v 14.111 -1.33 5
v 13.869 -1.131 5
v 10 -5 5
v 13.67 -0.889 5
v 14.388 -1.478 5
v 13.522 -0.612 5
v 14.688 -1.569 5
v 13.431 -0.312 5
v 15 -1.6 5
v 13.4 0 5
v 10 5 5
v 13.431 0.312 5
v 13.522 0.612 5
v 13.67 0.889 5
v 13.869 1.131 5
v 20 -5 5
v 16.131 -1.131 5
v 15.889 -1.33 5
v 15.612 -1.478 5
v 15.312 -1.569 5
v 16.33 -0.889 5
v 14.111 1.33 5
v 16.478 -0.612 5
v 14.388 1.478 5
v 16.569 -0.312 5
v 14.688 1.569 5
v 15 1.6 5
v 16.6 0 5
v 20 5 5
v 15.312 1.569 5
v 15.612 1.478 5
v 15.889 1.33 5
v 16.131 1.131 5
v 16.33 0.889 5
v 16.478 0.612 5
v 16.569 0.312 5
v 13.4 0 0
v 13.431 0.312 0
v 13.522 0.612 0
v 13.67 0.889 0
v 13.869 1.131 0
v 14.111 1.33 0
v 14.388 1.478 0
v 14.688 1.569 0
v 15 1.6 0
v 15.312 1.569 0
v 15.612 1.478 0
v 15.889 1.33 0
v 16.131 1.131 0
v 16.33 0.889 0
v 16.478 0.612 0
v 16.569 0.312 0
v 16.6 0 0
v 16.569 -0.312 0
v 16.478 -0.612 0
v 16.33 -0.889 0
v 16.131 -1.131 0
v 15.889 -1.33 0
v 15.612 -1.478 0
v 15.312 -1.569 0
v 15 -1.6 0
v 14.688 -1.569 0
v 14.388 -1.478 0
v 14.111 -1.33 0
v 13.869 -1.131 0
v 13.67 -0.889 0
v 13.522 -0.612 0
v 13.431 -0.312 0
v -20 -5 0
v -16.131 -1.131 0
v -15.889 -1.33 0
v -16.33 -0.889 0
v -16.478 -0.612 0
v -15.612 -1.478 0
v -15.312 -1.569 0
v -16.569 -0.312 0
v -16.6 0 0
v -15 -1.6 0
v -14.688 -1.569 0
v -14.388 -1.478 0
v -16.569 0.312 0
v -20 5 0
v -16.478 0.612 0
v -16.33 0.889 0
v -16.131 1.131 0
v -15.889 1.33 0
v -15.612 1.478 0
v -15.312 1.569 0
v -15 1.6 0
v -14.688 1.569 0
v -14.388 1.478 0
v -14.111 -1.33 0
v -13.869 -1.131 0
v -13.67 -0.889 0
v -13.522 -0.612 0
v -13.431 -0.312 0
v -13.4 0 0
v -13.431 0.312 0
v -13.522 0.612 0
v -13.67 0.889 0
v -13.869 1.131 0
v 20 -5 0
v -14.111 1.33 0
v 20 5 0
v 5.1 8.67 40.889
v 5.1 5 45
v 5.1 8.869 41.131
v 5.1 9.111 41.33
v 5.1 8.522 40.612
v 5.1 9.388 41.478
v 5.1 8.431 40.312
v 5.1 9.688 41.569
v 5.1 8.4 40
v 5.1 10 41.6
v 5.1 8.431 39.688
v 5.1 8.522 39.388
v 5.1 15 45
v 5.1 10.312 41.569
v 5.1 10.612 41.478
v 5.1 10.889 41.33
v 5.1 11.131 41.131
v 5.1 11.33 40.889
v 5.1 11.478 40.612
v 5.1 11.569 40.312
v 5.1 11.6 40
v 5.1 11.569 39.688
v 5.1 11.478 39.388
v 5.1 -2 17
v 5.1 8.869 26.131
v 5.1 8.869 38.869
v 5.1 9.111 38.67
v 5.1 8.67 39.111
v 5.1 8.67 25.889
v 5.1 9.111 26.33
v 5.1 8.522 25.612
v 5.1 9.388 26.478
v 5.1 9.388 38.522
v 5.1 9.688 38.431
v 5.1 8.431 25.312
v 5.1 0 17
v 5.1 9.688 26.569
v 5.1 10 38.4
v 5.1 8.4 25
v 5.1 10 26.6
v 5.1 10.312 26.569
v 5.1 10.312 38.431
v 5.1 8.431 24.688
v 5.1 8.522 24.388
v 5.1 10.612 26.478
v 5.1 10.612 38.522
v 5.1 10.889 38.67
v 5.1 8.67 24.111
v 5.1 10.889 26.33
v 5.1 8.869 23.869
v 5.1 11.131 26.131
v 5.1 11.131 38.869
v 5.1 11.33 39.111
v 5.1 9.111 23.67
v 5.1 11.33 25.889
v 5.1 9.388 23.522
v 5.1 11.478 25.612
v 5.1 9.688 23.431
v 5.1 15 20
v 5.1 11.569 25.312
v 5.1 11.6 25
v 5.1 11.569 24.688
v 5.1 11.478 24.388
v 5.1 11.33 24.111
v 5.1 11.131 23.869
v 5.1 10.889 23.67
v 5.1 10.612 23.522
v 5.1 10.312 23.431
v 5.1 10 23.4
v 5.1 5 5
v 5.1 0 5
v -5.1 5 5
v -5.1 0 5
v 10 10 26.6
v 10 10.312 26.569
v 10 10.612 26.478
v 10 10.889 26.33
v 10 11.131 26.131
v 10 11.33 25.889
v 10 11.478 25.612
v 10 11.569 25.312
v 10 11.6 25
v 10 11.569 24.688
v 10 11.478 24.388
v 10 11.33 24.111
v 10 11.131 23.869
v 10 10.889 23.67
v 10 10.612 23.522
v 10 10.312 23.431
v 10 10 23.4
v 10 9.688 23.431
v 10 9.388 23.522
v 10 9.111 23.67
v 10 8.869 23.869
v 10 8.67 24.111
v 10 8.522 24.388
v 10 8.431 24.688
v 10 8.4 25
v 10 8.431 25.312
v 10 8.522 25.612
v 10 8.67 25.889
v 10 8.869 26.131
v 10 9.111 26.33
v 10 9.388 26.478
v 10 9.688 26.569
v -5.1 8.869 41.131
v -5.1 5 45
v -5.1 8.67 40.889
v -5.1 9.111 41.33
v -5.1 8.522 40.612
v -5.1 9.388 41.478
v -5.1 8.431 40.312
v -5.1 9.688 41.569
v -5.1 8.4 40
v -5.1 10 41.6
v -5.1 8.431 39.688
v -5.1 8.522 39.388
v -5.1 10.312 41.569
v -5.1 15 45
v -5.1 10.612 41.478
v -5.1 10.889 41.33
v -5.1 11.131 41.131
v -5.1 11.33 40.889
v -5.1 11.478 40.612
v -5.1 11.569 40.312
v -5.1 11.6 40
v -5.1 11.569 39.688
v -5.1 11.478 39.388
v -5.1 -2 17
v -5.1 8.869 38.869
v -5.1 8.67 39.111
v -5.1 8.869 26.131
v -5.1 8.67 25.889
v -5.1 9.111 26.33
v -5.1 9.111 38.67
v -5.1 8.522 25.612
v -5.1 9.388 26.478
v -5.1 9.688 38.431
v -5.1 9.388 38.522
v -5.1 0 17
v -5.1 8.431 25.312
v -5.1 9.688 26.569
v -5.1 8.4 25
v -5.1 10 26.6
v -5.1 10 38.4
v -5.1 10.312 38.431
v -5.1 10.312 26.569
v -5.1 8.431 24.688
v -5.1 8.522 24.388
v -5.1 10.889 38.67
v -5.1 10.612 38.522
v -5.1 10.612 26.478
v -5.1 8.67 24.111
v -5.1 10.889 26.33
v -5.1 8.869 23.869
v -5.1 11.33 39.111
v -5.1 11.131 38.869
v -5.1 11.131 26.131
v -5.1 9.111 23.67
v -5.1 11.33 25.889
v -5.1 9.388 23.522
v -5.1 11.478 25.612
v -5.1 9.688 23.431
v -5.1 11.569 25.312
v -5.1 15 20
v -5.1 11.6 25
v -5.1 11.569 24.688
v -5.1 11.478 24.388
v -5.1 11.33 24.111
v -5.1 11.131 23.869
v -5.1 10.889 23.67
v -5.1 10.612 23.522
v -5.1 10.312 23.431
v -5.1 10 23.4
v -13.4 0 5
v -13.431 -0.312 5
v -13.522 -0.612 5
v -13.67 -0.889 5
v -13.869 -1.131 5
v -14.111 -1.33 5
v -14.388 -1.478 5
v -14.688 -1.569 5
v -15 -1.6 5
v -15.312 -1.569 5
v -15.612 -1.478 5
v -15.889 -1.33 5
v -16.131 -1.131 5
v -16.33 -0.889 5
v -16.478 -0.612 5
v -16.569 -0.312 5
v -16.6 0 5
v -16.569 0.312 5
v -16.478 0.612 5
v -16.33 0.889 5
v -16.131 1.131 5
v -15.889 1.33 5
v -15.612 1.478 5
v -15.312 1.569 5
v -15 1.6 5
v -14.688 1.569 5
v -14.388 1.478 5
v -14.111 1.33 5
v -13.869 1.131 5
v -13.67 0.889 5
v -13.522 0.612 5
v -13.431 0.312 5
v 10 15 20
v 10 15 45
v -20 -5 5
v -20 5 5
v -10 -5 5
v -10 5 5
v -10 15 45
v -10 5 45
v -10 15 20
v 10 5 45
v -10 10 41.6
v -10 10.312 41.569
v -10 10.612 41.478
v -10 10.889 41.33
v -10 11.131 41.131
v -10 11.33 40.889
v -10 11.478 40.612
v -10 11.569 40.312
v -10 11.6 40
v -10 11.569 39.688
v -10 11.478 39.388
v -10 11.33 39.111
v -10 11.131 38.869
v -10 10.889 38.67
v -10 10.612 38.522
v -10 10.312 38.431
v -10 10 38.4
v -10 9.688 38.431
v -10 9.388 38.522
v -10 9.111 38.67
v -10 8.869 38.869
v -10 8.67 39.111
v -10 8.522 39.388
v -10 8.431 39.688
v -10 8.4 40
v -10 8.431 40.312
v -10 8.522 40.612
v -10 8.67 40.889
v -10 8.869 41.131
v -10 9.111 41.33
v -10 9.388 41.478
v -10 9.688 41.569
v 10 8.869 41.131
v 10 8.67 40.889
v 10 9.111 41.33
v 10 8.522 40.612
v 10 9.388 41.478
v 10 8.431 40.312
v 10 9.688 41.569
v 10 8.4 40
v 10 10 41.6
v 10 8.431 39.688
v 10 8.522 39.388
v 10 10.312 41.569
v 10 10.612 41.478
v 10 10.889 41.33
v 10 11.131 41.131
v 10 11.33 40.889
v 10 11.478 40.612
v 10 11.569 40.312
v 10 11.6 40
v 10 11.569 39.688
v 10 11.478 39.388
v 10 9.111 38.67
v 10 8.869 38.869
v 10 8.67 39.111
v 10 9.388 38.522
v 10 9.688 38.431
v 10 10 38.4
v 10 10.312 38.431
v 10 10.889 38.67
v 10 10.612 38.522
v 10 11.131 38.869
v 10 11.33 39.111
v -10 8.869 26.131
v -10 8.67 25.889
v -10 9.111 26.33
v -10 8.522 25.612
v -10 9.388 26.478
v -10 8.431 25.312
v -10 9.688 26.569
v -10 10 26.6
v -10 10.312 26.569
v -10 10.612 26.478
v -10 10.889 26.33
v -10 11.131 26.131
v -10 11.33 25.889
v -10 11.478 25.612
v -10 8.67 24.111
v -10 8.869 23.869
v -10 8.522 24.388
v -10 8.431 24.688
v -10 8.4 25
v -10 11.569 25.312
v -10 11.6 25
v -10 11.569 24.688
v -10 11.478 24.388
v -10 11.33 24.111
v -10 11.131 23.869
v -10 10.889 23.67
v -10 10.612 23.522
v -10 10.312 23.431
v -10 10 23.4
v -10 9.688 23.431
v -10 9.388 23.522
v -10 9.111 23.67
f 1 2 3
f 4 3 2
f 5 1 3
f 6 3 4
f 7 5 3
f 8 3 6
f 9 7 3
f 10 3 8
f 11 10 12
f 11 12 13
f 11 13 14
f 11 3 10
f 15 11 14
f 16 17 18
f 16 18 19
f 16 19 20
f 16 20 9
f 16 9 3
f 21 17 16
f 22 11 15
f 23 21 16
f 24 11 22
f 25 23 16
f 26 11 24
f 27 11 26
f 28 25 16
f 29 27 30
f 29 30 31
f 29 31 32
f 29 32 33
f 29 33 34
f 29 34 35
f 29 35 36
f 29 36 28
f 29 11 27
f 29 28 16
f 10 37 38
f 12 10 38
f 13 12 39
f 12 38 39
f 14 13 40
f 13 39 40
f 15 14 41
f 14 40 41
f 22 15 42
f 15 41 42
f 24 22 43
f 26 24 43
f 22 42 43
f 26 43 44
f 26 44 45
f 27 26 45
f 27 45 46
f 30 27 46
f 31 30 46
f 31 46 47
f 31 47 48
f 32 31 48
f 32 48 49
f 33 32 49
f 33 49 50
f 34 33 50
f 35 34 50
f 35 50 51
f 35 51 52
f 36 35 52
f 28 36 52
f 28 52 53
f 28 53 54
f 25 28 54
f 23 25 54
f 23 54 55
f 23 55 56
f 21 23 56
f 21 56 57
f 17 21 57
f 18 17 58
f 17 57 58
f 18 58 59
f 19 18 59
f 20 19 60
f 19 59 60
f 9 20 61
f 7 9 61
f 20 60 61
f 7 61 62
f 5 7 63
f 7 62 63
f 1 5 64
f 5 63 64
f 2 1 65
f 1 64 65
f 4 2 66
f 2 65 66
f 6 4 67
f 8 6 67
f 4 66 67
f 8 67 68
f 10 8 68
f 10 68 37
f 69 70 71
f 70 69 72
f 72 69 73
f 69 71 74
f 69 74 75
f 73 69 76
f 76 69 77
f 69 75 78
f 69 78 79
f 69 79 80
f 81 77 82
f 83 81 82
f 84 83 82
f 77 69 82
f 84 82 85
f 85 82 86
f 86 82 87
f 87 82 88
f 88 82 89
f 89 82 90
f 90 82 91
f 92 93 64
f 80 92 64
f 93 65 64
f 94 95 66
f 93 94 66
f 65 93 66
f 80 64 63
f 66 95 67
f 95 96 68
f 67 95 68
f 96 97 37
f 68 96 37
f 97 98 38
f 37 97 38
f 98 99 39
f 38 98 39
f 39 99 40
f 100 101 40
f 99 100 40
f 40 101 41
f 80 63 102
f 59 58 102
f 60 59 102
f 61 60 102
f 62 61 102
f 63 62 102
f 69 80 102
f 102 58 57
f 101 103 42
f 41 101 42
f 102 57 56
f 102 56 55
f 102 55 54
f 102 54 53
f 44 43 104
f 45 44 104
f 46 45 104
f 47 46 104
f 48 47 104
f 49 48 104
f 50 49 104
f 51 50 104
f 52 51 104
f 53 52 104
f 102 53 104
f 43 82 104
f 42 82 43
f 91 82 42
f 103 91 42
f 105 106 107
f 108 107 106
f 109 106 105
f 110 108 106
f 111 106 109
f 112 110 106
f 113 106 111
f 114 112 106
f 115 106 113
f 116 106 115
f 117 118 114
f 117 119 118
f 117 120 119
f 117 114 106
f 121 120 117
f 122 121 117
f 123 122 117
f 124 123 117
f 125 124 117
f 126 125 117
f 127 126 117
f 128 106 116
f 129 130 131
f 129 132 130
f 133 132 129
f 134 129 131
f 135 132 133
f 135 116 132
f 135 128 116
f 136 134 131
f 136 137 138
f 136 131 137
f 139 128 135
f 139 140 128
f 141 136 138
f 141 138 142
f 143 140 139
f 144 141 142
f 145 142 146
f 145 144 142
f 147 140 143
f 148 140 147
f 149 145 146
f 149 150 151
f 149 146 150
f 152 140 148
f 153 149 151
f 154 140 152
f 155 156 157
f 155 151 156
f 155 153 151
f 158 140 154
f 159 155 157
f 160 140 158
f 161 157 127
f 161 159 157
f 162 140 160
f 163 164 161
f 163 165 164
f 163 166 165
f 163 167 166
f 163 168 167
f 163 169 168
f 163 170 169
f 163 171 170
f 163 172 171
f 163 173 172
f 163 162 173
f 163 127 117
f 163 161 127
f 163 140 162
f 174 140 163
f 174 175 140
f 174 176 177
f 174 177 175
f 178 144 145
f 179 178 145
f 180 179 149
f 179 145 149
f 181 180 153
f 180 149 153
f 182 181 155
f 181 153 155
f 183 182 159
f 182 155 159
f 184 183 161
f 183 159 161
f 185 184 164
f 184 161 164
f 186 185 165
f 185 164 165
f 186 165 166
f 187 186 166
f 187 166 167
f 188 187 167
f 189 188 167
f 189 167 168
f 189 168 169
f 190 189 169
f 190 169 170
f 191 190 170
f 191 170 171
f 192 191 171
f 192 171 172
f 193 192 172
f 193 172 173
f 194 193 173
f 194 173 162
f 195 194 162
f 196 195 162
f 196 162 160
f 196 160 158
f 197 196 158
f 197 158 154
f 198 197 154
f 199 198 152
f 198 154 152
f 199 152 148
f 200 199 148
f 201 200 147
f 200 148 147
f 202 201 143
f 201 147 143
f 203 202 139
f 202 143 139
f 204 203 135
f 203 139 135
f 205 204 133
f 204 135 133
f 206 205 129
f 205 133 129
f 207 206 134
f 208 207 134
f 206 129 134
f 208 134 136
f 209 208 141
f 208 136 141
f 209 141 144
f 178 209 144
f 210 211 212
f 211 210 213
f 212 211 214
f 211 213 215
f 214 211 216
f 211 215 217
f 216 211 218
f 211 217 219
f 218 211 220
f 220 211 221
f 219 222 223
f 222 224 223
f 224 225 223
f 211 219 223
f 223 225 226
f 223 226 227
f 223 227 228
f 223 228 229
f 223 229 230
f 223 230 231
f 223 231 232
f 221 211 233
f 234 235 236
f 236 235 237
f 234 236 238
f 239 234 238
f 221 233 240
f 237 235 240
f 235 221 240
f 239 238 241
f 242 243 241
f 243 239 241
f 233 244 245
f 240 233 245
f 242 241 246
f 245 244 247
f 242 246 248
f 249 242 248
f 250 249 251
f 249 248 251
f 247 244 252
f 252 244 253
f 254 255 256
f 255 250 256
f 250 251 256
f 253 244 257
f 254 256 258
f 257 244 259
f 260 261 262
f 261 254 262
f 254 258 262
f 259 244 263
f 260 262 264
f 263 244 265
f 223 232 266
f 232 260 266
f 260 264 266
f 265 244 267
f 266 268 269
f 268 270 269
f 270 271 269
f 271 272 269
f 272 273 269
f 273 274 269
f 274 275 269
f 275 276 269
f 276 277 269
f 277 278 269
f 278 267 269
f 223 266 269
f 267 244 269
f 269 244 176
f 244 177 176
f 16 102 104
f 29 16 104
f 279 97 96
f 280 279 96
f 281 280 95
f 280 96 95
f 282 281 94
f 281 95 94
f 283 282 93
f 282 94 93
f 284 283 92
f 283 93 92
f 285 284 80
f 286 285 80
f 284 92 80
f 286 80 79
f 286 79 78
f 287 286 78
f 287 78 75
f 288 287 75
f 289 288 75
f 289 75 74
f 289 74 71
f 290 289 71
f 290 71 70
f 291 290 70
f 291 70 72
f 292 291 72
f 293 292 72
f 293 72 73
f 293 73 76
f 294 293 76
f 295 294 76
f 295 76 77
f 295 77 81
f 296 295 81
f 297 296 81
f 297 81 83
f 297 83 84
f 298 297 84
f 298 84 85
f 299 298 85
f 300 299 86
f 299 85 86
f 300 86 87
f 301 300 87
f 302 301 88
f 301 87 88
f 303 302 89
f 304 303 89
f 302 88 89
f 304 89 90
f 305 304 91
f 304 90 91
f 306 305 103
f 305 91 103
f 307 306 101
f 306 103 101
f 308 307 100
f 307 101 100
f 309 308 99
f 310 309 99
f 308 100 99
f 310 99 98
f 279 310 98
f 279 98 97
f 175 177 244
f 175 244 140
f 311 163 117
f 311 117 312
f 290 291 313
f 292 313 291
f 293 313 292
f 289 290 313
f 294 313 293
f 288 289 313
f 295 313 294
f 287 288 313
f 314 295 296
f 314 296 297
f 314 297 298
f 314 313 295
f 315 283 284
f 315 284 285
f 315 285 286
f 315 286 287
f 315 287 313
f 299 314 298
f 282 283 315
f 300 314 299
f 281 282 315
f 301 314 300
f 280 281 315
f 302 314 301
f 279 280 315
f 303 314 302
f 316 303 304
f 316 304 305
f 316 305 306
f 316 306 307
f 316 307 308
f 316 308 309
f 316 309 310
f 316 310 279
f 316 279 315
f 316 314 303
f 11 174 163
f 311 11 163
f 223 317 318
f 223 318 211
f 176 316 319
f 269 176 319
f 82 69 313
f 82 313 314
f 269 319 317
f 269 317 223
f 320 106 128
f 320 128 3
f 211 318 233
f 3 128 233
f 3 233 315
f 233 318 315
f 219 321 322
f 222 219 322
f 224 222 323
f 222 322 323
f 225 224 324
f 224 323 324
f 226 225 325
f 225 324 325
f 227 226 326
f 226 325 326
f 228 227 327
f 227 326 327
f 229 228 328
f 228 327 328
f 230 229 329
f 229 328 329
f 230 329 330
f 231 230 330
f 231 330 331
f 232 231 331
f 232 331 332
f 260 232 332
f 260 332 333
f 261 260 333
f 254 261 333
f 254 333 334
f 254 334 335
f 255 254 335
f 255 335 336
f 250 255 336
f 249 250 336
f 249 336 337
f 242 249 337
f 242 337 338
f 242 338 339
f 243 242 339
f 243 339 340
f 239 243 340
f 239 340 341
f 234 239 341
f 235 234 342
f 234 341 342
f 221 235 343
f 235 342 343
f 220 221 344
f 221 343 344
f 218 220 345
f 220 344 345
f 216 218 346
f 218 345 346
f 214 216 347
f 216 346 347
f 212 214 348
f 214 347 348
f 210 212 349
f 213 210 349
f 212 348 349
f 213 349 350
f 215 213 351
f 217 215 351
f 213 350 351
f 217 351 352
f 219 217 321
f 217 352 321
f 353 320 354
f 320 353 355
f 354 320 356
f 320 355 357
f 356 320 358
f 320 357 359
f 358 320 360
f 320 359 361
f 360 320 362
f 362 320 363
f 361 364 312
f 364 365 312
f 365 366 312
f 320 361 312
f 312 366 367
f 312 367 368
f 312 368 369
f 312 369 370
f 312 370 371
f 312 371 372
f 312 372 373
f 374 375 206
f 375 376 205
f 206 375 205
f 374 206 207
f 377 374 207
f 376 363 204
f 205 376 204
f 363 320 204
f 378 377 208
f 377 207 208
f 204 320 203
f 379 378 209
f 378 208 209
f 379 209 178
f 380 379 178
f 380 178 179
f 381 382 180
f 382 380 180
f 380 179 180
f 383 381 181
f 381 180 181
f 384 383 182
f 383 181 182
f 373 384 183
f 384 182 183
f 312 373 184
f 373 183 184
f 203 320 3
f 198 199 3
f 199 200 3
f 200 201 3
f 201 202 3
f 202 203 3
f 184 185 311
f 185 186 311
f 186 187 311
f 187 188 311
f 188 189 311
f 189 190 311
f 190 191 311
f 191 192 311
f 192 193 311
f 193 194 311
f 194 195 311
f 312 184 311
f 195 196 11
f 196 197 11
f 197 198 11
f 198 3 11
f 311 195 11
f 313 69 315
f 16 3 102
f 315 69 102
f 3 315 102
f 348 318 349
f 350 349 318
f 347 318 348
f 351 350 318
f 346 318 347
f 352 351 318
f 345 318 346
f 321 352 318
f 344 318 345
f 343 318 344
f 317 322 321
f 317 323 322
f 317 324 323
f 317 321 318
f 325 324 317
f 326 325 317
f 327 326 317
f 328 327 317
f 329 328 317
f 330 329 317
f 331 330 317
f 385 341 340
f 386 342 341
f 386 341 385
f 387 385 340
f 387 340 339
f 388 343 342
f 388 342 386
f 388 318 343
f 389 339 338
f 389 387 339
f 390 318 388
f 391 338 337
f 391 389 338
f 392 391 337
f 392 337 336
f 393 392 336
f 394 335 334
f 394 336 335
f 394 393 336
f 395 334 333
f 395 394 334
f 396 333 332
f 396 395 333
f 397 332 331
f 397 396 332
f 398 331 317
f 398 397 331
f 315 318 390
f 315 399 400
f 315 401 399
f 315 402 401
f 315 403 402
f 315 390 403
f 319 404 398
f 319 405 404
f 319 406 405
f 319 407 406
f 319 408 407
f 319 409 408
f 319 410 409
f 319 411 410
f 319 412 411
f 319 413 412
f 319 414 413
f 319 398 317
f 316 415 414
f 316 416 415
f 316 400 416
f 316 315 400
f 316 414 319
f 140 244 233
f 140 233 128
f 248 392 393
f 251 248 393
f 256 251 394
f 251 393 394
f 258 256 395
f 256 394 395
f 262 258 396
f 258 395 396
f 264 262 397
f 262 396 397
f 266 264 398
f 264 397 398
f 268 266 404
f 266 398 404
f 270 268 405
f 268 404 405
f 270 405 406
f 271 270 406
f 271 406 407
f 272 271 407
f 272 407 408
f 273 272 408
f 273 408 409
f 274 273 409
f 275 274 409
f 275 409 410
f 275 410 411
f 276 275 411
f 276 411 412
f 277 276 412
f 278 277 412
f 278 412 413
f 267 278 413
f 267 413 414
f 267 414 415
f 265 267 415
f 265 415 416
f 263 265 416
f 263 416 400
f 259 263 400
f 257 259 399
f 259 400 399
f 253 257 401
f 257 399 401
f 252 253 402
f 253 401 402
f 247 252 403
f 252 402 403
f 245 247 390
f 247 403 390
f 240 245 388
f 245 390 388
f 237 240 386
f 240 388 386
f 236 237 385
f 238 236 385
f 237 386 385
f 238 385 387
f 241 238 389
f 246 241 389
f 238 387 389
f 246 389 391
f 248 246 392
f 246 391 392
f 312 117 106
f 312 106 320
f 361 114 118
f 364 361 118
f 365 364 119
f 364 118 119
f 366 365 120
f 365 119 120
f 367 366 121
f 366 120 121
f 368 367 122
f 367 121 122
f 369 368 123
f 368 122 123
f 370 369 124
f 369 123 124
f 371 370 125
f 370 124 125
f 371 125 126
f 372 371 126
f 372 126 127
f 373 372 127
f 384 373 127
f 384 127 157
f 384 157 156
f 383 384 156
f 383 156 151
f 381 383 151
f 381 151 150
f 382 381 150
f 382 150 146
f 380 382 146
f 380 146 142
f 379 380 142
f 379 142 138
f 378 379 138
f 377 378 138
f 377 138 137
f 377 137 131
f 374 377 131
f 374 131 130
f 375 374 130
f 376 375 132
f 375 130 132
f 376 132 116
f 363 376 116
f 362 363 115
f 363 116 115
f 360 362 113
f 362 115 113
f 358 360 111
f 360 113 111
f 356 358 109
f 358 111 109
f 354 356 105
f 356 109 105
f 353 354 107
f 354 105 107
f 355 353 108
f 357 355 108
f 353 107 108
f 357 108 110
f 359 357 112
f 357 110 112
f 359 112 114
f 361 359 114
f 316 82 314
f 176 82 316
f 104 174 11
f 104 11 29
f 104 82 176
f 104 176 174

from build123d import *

# Parameters (mm, degrees)
SKETCH1_W           = 40
SKETCH1_H           = 10
BOSS_EXTRUDE1_DEPTH = 5
SKETCH2_W           = 4.9
SKETCH2_H           = 20
BOSS_EXTRUDE2_DEPTH = 40
CUT_EXTRUDE1_REACH  = 58.125
SKETCH3_R           = 1.6
CUT_EXTRUDE2_REACH  = 58.125
CUT_EXTRUDE3_REACH  = 58.125
CUT_EXTRUDE4_REACH  = 53.478
SKETCH6_R           = 1.6
SKETCH7_W           = 10.2
SKETCH7_H           = 3
BOSS_EXTRUDE3_DEPTH = 40
CUT_EXTRUDE5_DEPTH  = 40
SKETCH10_W          = 10.2
SKETCH10_H          = 2
BOSS_EXTRUDE4_DEPTH = 12


with BuildPart() as part:
    # Sketch1 → Boss-Extrude1 (new body)
    with BuildSketch(Plane.XY):
        Rectangle(SKETCH1_W, SKETCH1_H)
    extrude(amount=BOSS_EXTRUDE1_DEPTH)

    # Sketch2 → Boss-Extrude2 (add)
    with BuildSketch(Plane.XY.offset(5)):
        with Locations((7.55, 5)):
            Rectangle(SKETCH2_W, SKETCH2_H)
        with Locations((-7.55, 5)):
            Rectangle(SKETCH2_W, SKETCH2_H)
    extrude(amount=BOSS_EXTRUDE2_DEPTH)

    # Cut-Extrude1: up to this face of the body (flat: up to its plane)
    cut_extrude1_end = Plane(part.part.faces().sort_by_distance((10, 5, 25))[0])
    # Sketch3 → Cut-Extrude1 (cut, up to the picked face)
    with BuildSketch(Plane.ZY.offset(10), mode=Mode.PRIVATE) as cut_extrude1_sk1:
        with Locations((40, 10)):
            Circle(SKETCH3_R)
    cut_extrude1_tool1 = split(extrude(cut_extrude1_sk1.sketch, amount=-CUT_EXTRUDE1_REACH, mode=Mode.PRIVATE), bisect_by=cut_extrude1_end, keep=Keep.BOTH, mode=Mode.PRIVATE)
    # Sketch3 → Cut-Extrude1 (cut, up to the picked face)
    with BuildSketch(Plane.ZY.offset(10), mode=Mode.PRIVATE) as cut_extrude1_sk2:
        with Locations((25, 10)):
            Circle(SKETCH3_R)
    cut_extrude1_tool2 = split(extrude(cut_extrude1_sk2.sketch, amount=-CUT_EXTRUDE1_REACH, mode=Mode.PRIVATE), bisect_by=cut_extrude1_end, keep=Keep.BOTH, mode=Mode.PRIVATE)
    add(cut_extrude1_tool1.solids().sort_by(Axis((-10, 10, 40), (1, 0, 0)))[0], mode=Mode.SUBTRACT)
    add(cut_extrude1_tool2.solids().sort_by(Axis((-10, 10, 25), (1, 0, 0)))[0], mode=Mode.SUBTRACT)

    # Cut-Extrude2: up to this face of the body (flat: up to its plane)
    cut_extrude2_end = Plane(part.part.faces().sort_by_distance((10, 4.897406266, 24.846109398))[0])
    # Sketch4 → Cut-Extrude2 (cut, up to the picked face)
    with BuildSketch(Plane.ZY.offset(10), mode=Mode.PRIVATE) as cut_extrude2_sk1:
        Polygon((5, 5), (20, 15), (5, 15), align=None)
    cut_extrude2_tool1 = split(extrude(cut_extrude2_sk1.sketch, amount=-CUT_EXTRUDE2_REACH, mode=Mode.PRIVATE), bisect_by=cut_extrude2_end, keep=Keep.BOTH, mode=Mode.PRIVATE)
    add(cut_extrude2_tool1.solids().sort_by(Axis((-10, 11.666667, 10), (1, 0, 0)))[0], mode=Mode.SUBTRACT)

    # Cut-Extrude3: up to this face of the body (flat: up to its plane)
    cut_extrude3_end = Plane(part.part.faces().sort_by_distance((10, 4.181249184, 26.416760511))[0])
    # Sketch5 → Cut-Extrude3 (cut, up to the picked face)
    with BuildSketch(Plane.ZY.offset(10), mode=Mode.PRIVATE) as cut_extrude3_sk1:
        Polygon((45, 5), (5, -5), (45, -5), align=None)
    cut_extrude3_tool1 = split(extrude(cut_extrude3_sk1.sketch, amount=-CUT_EXTRUDE3_REACH, mode=Mode.PRIVATE), bisect_by=cut_extrude3_end, keep=Keep.BOTH, mode=Mode.PRIVATE)
    add(cut_extrude3_tool1.solids().sort_by(Axis((-10, -1.666667, 31.666667), (1, 0, 0)))[0], mode=Mode.SUBTRACT)

    # Sketch6 → Cut-Extrude4 (cut, up to next)
    with BuildSketch(Plane(origin=(0, 0, 0), x_dir=(-1, 0, 0), z_dir=(0, 0, -1)), mode=Mode.PRIVATE) as cut_extrude4_sk1:
        with Locations((-15, 0)):
            Circle(SKETCH6_R)
    cut_extrude4_tool1 = extrude(cut_extrude4_sk1.sketch, amount=-CUT_EXTRUDE4_REACH, mode=Mode.PRIVATE) & part.part
    # Sketch6 → Cut-Extrude4 (cut, up to next)
    with BuildSketch(Plane(origin=(0, 0, 0), x_dir=(-1, 0, 0), z_dir=(0, 0, -1)), mode=Mode.PRIVATE) as cut_extrude4_sk2:
        with Locations(Location((15, 0, 0), (0, 0, 180))):
            Circle(SKETCH6_R)
    cut_extrude4_tool2 = extrude(cut_extrude4_sk2.sketch, amount=-CUT_EXTRUDE4_REACH, mode=Mode.PRIVATE) & part.part
    add(cut_extrude4_tool1.solids().sort_by_distance((15, 0, 0))[0], mode=Mode.SUBTRACT)
    add(cut_extrude4_tool2.solids().sort_by_distance((-15, 0, 0))[0], mode=Mode.SUBTRACT)

    # Sketch7 → Boss-Extrude3 (add)
    with BuildSketch(Plane.XY.offset(5)):
        with Locations((0, -3.5)):
            Rectangle(SKETCH7_W, SKETCH7_H)
    extrude(amount=BOSS_EXTRUDE3_DEPTH)

    # Sketch8 → Cut-Extrude5 (cut)
    with BuildSketch(Plane.ZY.offset(5.1)):
        Polygon((5, -5), (25, 0), (45, 0), (45, -5), align=None)
    extrude(amount=-CUT_EXTRUDE5_DEPTH, mode=Mode.SUBTRACT)

    # Sketch10 → Boss-Extrude4 (add)
    with BuildSketch(Plane.XY.offset(5)):
        with Locations((0, -1)):
            Rectangle(SKETCH10_W, SKETCH10_H)
    extrude(amount=BOSS_EXTRUDE4_DEPTH)


solid = part.part
